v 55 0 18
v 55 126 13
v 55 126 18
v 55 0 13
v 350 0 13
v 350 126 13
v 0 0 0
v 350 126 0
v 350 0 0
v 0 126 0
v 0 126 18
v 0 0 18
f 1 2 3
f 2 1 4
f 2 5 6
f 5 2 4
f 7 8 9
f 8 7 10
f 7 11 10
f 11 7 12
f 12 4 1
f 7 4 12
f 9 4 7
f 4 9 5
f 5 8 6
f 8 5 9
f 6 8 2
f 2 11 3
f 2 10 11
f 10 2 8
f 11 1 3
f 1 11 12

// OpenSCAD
translate([27.5, 10.5, 6.5]) color([0.9489319289416618, 0.05785711390101722, 0.40862622118314806]) cube([55, 21, 13], center=true);
translate([93.5, 10.5, 6.5]) color([0.41722547979620506, 0.728180504599678, 0.3206710028745039]) cube([77, 21, 13], center=true);
translate([192.5, 10.5, 6.5]) color([0.20399027594623398, 0.2933116551663051, 0.4708875424493587]) cube([121, 21, 13], center=true);
translate([301.5, 10.5, 6.5]) color([0.9502683295716211, 0.7965170227633064, 0.2769702457797433]) cube([97, 21, 13], center=true);
translate([27.5, 31.5, 6.5]) color([0.5581815883930463, 0.6882003035685332, 0.7956571556821322]) cube([55, 21, 13], center=true);
translate([93.5, 31.5, 6.5]) color([0.4461643839498476, 0.398776905129706, 0.7676407428212785]) cube([77, 21, 13], center=true);
translate([192.5, 31.5, 6.5]) color([0.43171649556411207, 0.2479576688970051, 0.4534470315306477]) cube([121, 21, 13], center=true);
translate([301.5, 31.5, 6.5]) color([0.9371046462904561, 0.14256748821860132, 0.4624353545272121]) cube([97, 21, 13], center=true);
translate([27.5, 52.5, 6.5]) color([0.6373035243637815, 0.48328798826810027, 0.20363990437036994]) cube([55, 21, 13], center=true);
translate([93.5, 52.5, 6.5]) color([0.0018431606156659175, 0.698991711803439, 0.6187355180234525]) cube([77, 21, 13], center=true);
translate([192.5, 52.5, 6.5]) color([0.007776649435864202, 0.2985601210181208, 0.7686342595428415]) cube([121, 21, 13], center=true);
translate([301.5, 52.5, 6.5]) color([0.6289203785446209, 0.5452081159439722, 0.1562211098090489]) cube([97, 21, 13], center=true);
translate([27.5, 73.5, 6.5]) color([0.7062940429996885, 0.4714349217158037, 0.6781787462359636]) cube([55, 21, 13], center=true);
translate([93.5, 73.5, 6.5]) color([0.7600898367234922, 0.23236272144124515, 0.7619950130977117]) cube([77, 21, 13], center=true);
translate([192.5, 73.5, 6.5]) color([0.28008838468838926, 0.9840151371182455, 0.12083161078451865]) cube([121, 21, 13], center=true);
translate([301.5, 73.5, 6.5]) color([0.8837180187440564, 0.040547125043371324, 0.256575818348144]) cube([97, 21, 13], center=true);
translate([27.5, 94.5, 6.5]) color([0.5261019087624684, 0.5816161834445946, 0.3962349850280922]) cube([55, 21, 13], center=true);
translate([93.5, 94.5, 6.5]) color([0.10203172822707107, 0.2526080858247133, 0.28339650386048865]) cube([77, 21, 13], center=true);
translate([192.5, 94.5, 6.5]) color([0.7552228545587315, 0.9087743252220071, 0.5954099154864194]) cube([121, 21, 13], center=true);
translate([301.5, 94.5, 6.5]) color([0.03545096569102746, 0.7922364716417103, 0.30560393283991993]) cube([97, 21, 13], center=true);
translate([27.5, 115.5, 6.5]) color([0.33989040641624346, 0.5301854376454147, 0.24904704757555507]) cube([55, 21, 13], center=true);
translate([93.5, 115.5, 6.5]) color([0.9199780878573697, 0.1635547583408129, 0.41483040050373277]) cube([77, 21, 13], center=true);
translate([192.5, 115.5, 6.5]) color([0.2896919495072058, 0.5198341022016146, 0.5739818030823766]) cube([121, 21, 13], center=true);
translate([301.5, 115.5, 6.5]) color([0.6271396891048426, 0.5313758038379728, 0.4108045023355995]) cube([97, 21, 13], center=true);
translate([5.5, 3.5, 15.5]) color([0.634594012376466, 0.40341287658681757, 0.7785502590540477]) cube([11, 7, 5], center=true);
translate([16.5, 3.5, 15.5]) color([0.7881774252549901, 0.29225416811082217, 0.37180432355577453]) cube([11, 7, 5], center=true);
translate([27.5, 3.5, 15.5]) color([0.6288109059468862, 0.15706996711565713, 0.6970319309869248]) cube([11, 7, 5], center=true);
translate([38.5, 3.5, 15.5]) color([0.3814277529807131, 0.591062474757007, 0.1395330992312218]) cube([11, 7, 5], center=true);
translate([49.5, 3.5, 15.5]) color([0.6682583860975598, 0.3540578606136997, 0.4726655762072315]) cube([11, 7, 5], center=true);
translate([5.5, 10.5, 15.5]) color([0.4151074008495357, 0.47671524799509457, 0.6946956329164442]) cube([11, 7, 5], center=true);
translate([16.5, 10.5, 15.5]) color([0.31824017683207795, 0.6520544808985483, 0.060222107499701916]) cube([11, 7, 5], center=true);
translate([27.5, 10.5, 15.5]) color([0.3001851524622099, 0.7452096901500458, 0.05240587806206365]) cube([11, 7, 5], center=true);
translate([38.5, 10.5, 15.5]) color([0.6211421952822352, 0.025546799267838538, 0.4715288683099005]) cube([11, 7, 5], center=true);
translate([49.5, 10.5, 15.5]) color([0.8885450437134765, 0.010110093997603875, 0.5268280206539229]) cube([11, 7, 5], center=true);
translate([5.5, 17.5, 15.5]) color([0.06645682965886301, 0.8671097761494883, 0.6862965222396646]) cube([11, 7, 5], center=true);
translate([16.5, 17.5, 15.5]) color([0.7419538566814291, 0.669007579945888, 0.006423453698145676]) cube([11, 7, 5], center=true);
translate([27.5, 17.5, 15.5]) color([0.041177862257898545, 0.6208768040220466, 0.9996851255769114]) cube([11, 7, 5], center=true);
translate([38.5, 17.5, 15.5]) color([0.8731472390917929, 0.699685806725371, 0.7270999543422898]) cube([11, 7, 5], center=true);
translate([49.5, 17.5, 15.5]) color([0.2266870226016624, 0.751613934135812, 0.28792410486343756]) cube([11, 7, 5], center=true);
translate([5.5, 24.5, 15.5]) color([0.10546026702239297, 0.4608948954667579, 0.33019577252961807]) cube([11, 7, 5], center=true);
translate([16.5, 24.5, 15.5]) color([0.168255398651179, 0.42170989251140467, 0.8972009769638755]) cube([11, 7, 5], center=true);
translate([27.5, 24.5, 15.5]) color([0.4352702732981688, 0.4472918952497248, 0.708827757444238]) cube([11, 7, 5], center=true);
translate([38.5, 24.5, 15.5]) color([0.5241618701522923, 0.12922303534199353, 0.91039239754397]) cube([11, 7, 5], center=true);
translate([49.5, 24.5, 15.5]) color([0.4441243361619651, 0.7893377392253591, 0.38887513002224416]) cube([11, 7, 5], center=true);
translate([5.5, 31.5, 15.5]) color([0.806846018820692, 0.3895364160074527, 0.2201595216660458]) cube([11, 7, 5], center=true);
translate([16.5, 31.5, 15.5]) color([0.19619466691666865, 0.9400346443375104, 0.58653025858102]) cube([11, 7, 5], center=true);
translate([27.5, 31.5, 15.5]) color([0.04979326505826487, 0.38834759617804915, 0.234029260524927]) cube([11, 7, 5], center=true);
translate([38.5, 31.5, 15.5]) color([0.08465706460929934, 0.18675586852140846, 0.05699047999950346]) cube([11, 7, 5], center=true);
translate([49.5, 31.5, 15.5]) color([0.6380736282281027, 0.17337386483746886, 0.6107798762435255]) cube([11, 7, 5], center=true);
translate([5.5, 38.5, 15.5]) color([0.6125067478912297, 0.7049237107399368, 0.5121186506114312]) cube([11, 7, 5], center=true);
translate([16.5, 38.5, 15.5]) color([0.28442399033479826, 0.8774574539285279, 0.35307108172351365]) cube([11, 7, 5], center=true);
translate([27.5, 38.5, 15.5]) color([0.4582943249787391, 0.6318794317305464, 0.5161242981674495]) cube([11, 7, 5], center=true);
translate([38.5, 38.5, 15.5]) color([0.9564683485665337, 0.9547176774381221, 0.9297598506094263]) cube([11, 7, 5], center=true);
translate([49.5, 38.5, 15.5]) color([0.9340763496652581, 0.580960135568696, 0.49020206373000297]) cube([11, 7, 5], center=true);
translate([5.5, 45.5, 15.5]) color([0.7041168173823689, 0.21541959298546798, 0.26587203921552827]) cube([11, 7, 5], center=true);
translate([16.5, 45.5, 15.5]) color([0.04380725363309168, 0.16285754255803098, 0.0038745499388105342]) cube([11, 7, 5], center=true);
translate([27.5, 45.5, 15.5]) color([0.6546275765234981, 0.14040698903568194, 0.7866793455760521]) cube([11, 7, 5], center=true);
translate([38.5, 45.5, 15.5]) color([0.680503995881725, 0.9706757933544957, 0.3965144869518913]) cube([11, 7, 5], center=true);
translate([49.5, 45.5, 15.5]) color([0.9213919134510528, 0.4537041723195332, 0.3395037398362071]) cube([11, 7, 5], center=true);
translate([5.5, 52.5, 15.5]) color([0.10233886991705377, 0.8828321850718597, 0.7947901585625868]) cube([11, 7, 5], center=true);
translate([16.5, 52.5, 15.5]) color([0.3229289765350606, 0.45574438492562896, 0.32514346581324827]) cube([11, 7, 5], center=true);
translate([27.5, 52.5, 15.5]) color([0.028829116538094723, 0.04435252539911694, 0.3687041258820589]) cube([11, 7, 5], center=true);
translate([38.5, 52.5, 15.5]) color([0.20959132812878367, 0.5245146032105923, 0.1877850356496189]) cube([11, 7, 5], center=true);
translate([49.5, 52.5, 15.5]) color([0.2016215864664097, 0.6726678813176303, 0.7356026567617159]) cube([11, 7, 5], center=true);
translate([5.5, 59.5, 15.5]) color([0.31223209587410494, 0.8599943994333726, 0.2546391746557106]) cube([11, 7, 5], center=true);
translate([16.5, 59.5, 15.5]) color([0.34394037628155716, 0.712480390369609, 0.04450290132920964]) cube([11, 7, 5], center=true);
translate([27.5, 59.5, 15.5]) color([0.934183460116191, 0.07233773178762537, 0.4609310589380602]) cube([11, 7, 5], center=true);
translate([38.5, 59.5, 15.5]) color([0.7246048259600892, 0.04746853498479808, 0.8090026856371774]) cube([11, 7, 5], center=true);
translate([49.5, 59.5, 15.5]) color([0.9788933433114139, 0.460511672795628, 0.11812363628756806]) cube([11, 7, 5], center=true);
translate([5.5, 66.5, 15.5]) color([0.08147699565547994, 0.09873043616313526, 0.7654413741364753]) cube([11, 7, 5], center=true);
translate([16.5, 66.5, 15.5]) color([0.4140128484685186, 0.9192341581990311, 0.4406397760864845]) cube([11, 7, 5], center=true);
translate([27.5, 66.5, 15.5]) color([0.07714331014460807, 0.42693558751800065, 0.7548278934255565]) cube([11, 7, 5], center=true);
translate([38.5, 66.5, 15.5]) color([0.8293384268467949, 0.039351686529191854, 0.1803893912563338]) cube([11, 7, 5], center=true);
translate([49.5, 66.5, 15.5]) color([0.490013452023644, 0.12808547795160863, 0.8710926419421733]) cube([11, 7, 5], center=true);
translate([5.5, 73.5, 15.5]) color([0.9344608884461488, 0.3195969983538176, 0.43484368255202]) cube([11, 7, 5], center=true);
translate([16.5, 73.5, 15.5]) color([0.5570540644200566, 0.2855057910835891, 0.5410756974595614]) cube([11, 7, 5], center=true);
translate([27.5, 73.5, 15.5]) color([0.2011850454737838, 0.2966412512769129, 0.44178363318767744]) cube([11, 7, 5], center=true);
translate([38.5, 73.5, 15.5]) color([0.604669902191143, 0.5361650260862432, 0.2609879767339395]) cube([11, 7, 5], center=true);
translate([49.5, 73.5, 15.5]) color([0.23178787541805523, 0.11873023670071103, 0.7834936358921726]) cube([11, 7, 5], center=true);
translate([5.5, 80.5, 15.5]) color([0.09890076646638046, 0.7328850061793606, 0.2487736956630997]) cube([11, 7, 5], center=true);
translate([16.5, 80.5, 15.5]) color([0.28455698400578255, 0.7360834330107994, 0.6596207917216363]) cube([11, 7, 5], center=true);
translate([27.5, 80.5, 15.5]) color([0.7419215555155583, 0.5152830587943614, 0.8590958196652707]) cube([11, 7, 5], center=true);
translate([38.5, 80.5, 15.5]) color([0.12179389137547159, 0.6451969614065052, 0.11824431248865597]) cube([11, 7, 5], center=true);
translate([49.5, 80.5, 15.5]) color([0.7372833681454282, 0.3589046614584527, 0.67488210437111]) cube([11, 7, 5], center=true);
translate([5.5, 87.5, 15.5]) color([0.7034839134412817, 0.6606084576410584, 0.22155798032782648]) cube([11, 7, 5], center=true);
translate([16.5, 87.5, 15.5]) color([0.8317998863873537, 0.24013608742346748, 0.5181532972121122]) cube([11, 7, 5], center=true);
translate([27.5, 87.5, 15.5]) color([0.6746457541533513, 0.23360317478475656, 0.628511722983939]) cube([11, 7, 5], center=true);
translate([38.5, 87.5, 15.5]) color([0.2868310479973286, 0.1713823760843869, 0.809748828526577]) cube([11, 7, 5], center=true);
translate([49.5, 87.5, 15.5]) color([0.5531227700773604, 0.32788470660885605, 0.5854309472055399]) cube([11, 7, 5], center=true);
translate([5.5, 94.5, 15.5]) color([0.025286397427288332, 0.12982285676032723, 0.3955808516982431]) cube([11, 7, 5], center=true);
translate([16.5, 94.5, 15.5]) color([0.9757565794644123, 0.5104745178761232, 0.07645620506689521]) cube([11, 7, 5], center=true);
translate([27.5, 94.5, 15.5]) color([0.7650406152494567, 0.7814438709253152, 0.7748021743948562]) cube([11, 7, 5], center=true);
translate([38.5, 94.5, 15.5]) color([0.5694980380479538, 0.6956987378694627, 0.21345793631163135]) cube([11, 7, 5], center=true);
translate([49.5, 94.5, 15.5]) color([0.7325605908939883, 0.8161739873415944, 0.7599665402219192]) cube([11, 7, 5], center=true);
translate([5.5, 101.5, 15.5]) color([0.353462402585887, 0.5910280505757086, 0.6289893574898388]) cube([11, 7, 5], center=true);
translate([16.5, 101.5, 15.5]) color([0.9008098536570839, 0.1080138952733335, 0.8339337708504084]) cube([11, 7, 5], center=true);
translate([27.5, 101.5, 15.5]) color([0.5264355584690392, 0.3586141205519373, 0.4556029014937524]) cube([11, 7, 5], center=true);
translate([38.5, 101.5, 15.5]) color([0.012635498930738787, 0.22007359233142765, 0.6527634200680049]) cube([11, 7, 5], center=true);
translate([49.5, 101.5, 15.5]) color([0.660849279754449, 0.4946989402863131, 0.9533258805973196]) cube([11, 7, 5], center=true);
translate([5.5, 108.5, 15.5]) color([0.4809150885494712, 0.3139436595456605, 0.8477808391956414]) cube([11, 7, 5], center=true);
translate([16.5, 108.5, 15.5]) color([0.259158299397262, 0.6043059930343495, 0.7034188523223]) cube([11, 7, 5], center=true);
translate([27.5, 108.5, 15.5]) color([0.8216962986917842, 0.7853687501827489, 0.3840923305137113]) cube([11, 7, 5], center=true);
translate([38.5, 108.5, 15.5]) color([0.059180305962736934, 0.03828786548344276, 0.7264603879084595]) cube([11, 7, 5], center=true);
translate([49.5, 108.5, 15.5]) color([0.9616913814068508, 0.3431653742712939, 0.44119509807551416]) cube([11, 7, 5], center=true);
translate([5.5, 115.5, 15.5]) color([0.7257980157417766, 0.6578312458538799, 0.26010658848413604]) cube([11, 7, 5], center=true);
translate([16.5, 115.5, 15.5]) color([0.6715848457987025, 0.3049024195743838, 0.3563579065620385]) cube([11, 7, 5], center=true);
translate([27.5, 115.5, 15.5]) color([0.5395133052630944, 0.7323138239267305, 0.15121621156796483]) cube([11, 7, 5], center=true);
translate([38.5, 115.5, 15.5]) color([0.021987210892938758, 0.6278299544850219, 0.024564677785836264]) cube([11, 7, 5], center=true);
translate([49.5, 115.5, 15.5]) color([0.04496324071616853, 0.22577557672213355, 0.6538768733044555]) cube([11, 7, 5], center=true);
translate([5.5, 122.5, 15.5]) color([0.06654509768602879, 0.06240576762652772, 0.9720932443736168]) cube([11, 7, 5], center=true);
translate([16.5, 122.5, 15.5]) color([0.4226528937805498, 0.8924289339928592, 0.21652428395276402]) cube([11, 7, 5], center=true);
translate([27.5, 122.5, 15.5]) color([0.4352131794546169, 0.35803513461315506, 0.17693553603496914]) cube([11, 7, 5], center=true);
translate([38.5, 122.5, 15.5]) color([0.32881318575191665, 0.9867958186960467, 0.7473090097951195]) cube([11, 7, 5], center=true);
translate([49.5, 122.5, 15.5]) color([0.3826682791831585, 0.40928443439993156, 0.2637409011550663]) cube([11, 7, 5], center=true);
